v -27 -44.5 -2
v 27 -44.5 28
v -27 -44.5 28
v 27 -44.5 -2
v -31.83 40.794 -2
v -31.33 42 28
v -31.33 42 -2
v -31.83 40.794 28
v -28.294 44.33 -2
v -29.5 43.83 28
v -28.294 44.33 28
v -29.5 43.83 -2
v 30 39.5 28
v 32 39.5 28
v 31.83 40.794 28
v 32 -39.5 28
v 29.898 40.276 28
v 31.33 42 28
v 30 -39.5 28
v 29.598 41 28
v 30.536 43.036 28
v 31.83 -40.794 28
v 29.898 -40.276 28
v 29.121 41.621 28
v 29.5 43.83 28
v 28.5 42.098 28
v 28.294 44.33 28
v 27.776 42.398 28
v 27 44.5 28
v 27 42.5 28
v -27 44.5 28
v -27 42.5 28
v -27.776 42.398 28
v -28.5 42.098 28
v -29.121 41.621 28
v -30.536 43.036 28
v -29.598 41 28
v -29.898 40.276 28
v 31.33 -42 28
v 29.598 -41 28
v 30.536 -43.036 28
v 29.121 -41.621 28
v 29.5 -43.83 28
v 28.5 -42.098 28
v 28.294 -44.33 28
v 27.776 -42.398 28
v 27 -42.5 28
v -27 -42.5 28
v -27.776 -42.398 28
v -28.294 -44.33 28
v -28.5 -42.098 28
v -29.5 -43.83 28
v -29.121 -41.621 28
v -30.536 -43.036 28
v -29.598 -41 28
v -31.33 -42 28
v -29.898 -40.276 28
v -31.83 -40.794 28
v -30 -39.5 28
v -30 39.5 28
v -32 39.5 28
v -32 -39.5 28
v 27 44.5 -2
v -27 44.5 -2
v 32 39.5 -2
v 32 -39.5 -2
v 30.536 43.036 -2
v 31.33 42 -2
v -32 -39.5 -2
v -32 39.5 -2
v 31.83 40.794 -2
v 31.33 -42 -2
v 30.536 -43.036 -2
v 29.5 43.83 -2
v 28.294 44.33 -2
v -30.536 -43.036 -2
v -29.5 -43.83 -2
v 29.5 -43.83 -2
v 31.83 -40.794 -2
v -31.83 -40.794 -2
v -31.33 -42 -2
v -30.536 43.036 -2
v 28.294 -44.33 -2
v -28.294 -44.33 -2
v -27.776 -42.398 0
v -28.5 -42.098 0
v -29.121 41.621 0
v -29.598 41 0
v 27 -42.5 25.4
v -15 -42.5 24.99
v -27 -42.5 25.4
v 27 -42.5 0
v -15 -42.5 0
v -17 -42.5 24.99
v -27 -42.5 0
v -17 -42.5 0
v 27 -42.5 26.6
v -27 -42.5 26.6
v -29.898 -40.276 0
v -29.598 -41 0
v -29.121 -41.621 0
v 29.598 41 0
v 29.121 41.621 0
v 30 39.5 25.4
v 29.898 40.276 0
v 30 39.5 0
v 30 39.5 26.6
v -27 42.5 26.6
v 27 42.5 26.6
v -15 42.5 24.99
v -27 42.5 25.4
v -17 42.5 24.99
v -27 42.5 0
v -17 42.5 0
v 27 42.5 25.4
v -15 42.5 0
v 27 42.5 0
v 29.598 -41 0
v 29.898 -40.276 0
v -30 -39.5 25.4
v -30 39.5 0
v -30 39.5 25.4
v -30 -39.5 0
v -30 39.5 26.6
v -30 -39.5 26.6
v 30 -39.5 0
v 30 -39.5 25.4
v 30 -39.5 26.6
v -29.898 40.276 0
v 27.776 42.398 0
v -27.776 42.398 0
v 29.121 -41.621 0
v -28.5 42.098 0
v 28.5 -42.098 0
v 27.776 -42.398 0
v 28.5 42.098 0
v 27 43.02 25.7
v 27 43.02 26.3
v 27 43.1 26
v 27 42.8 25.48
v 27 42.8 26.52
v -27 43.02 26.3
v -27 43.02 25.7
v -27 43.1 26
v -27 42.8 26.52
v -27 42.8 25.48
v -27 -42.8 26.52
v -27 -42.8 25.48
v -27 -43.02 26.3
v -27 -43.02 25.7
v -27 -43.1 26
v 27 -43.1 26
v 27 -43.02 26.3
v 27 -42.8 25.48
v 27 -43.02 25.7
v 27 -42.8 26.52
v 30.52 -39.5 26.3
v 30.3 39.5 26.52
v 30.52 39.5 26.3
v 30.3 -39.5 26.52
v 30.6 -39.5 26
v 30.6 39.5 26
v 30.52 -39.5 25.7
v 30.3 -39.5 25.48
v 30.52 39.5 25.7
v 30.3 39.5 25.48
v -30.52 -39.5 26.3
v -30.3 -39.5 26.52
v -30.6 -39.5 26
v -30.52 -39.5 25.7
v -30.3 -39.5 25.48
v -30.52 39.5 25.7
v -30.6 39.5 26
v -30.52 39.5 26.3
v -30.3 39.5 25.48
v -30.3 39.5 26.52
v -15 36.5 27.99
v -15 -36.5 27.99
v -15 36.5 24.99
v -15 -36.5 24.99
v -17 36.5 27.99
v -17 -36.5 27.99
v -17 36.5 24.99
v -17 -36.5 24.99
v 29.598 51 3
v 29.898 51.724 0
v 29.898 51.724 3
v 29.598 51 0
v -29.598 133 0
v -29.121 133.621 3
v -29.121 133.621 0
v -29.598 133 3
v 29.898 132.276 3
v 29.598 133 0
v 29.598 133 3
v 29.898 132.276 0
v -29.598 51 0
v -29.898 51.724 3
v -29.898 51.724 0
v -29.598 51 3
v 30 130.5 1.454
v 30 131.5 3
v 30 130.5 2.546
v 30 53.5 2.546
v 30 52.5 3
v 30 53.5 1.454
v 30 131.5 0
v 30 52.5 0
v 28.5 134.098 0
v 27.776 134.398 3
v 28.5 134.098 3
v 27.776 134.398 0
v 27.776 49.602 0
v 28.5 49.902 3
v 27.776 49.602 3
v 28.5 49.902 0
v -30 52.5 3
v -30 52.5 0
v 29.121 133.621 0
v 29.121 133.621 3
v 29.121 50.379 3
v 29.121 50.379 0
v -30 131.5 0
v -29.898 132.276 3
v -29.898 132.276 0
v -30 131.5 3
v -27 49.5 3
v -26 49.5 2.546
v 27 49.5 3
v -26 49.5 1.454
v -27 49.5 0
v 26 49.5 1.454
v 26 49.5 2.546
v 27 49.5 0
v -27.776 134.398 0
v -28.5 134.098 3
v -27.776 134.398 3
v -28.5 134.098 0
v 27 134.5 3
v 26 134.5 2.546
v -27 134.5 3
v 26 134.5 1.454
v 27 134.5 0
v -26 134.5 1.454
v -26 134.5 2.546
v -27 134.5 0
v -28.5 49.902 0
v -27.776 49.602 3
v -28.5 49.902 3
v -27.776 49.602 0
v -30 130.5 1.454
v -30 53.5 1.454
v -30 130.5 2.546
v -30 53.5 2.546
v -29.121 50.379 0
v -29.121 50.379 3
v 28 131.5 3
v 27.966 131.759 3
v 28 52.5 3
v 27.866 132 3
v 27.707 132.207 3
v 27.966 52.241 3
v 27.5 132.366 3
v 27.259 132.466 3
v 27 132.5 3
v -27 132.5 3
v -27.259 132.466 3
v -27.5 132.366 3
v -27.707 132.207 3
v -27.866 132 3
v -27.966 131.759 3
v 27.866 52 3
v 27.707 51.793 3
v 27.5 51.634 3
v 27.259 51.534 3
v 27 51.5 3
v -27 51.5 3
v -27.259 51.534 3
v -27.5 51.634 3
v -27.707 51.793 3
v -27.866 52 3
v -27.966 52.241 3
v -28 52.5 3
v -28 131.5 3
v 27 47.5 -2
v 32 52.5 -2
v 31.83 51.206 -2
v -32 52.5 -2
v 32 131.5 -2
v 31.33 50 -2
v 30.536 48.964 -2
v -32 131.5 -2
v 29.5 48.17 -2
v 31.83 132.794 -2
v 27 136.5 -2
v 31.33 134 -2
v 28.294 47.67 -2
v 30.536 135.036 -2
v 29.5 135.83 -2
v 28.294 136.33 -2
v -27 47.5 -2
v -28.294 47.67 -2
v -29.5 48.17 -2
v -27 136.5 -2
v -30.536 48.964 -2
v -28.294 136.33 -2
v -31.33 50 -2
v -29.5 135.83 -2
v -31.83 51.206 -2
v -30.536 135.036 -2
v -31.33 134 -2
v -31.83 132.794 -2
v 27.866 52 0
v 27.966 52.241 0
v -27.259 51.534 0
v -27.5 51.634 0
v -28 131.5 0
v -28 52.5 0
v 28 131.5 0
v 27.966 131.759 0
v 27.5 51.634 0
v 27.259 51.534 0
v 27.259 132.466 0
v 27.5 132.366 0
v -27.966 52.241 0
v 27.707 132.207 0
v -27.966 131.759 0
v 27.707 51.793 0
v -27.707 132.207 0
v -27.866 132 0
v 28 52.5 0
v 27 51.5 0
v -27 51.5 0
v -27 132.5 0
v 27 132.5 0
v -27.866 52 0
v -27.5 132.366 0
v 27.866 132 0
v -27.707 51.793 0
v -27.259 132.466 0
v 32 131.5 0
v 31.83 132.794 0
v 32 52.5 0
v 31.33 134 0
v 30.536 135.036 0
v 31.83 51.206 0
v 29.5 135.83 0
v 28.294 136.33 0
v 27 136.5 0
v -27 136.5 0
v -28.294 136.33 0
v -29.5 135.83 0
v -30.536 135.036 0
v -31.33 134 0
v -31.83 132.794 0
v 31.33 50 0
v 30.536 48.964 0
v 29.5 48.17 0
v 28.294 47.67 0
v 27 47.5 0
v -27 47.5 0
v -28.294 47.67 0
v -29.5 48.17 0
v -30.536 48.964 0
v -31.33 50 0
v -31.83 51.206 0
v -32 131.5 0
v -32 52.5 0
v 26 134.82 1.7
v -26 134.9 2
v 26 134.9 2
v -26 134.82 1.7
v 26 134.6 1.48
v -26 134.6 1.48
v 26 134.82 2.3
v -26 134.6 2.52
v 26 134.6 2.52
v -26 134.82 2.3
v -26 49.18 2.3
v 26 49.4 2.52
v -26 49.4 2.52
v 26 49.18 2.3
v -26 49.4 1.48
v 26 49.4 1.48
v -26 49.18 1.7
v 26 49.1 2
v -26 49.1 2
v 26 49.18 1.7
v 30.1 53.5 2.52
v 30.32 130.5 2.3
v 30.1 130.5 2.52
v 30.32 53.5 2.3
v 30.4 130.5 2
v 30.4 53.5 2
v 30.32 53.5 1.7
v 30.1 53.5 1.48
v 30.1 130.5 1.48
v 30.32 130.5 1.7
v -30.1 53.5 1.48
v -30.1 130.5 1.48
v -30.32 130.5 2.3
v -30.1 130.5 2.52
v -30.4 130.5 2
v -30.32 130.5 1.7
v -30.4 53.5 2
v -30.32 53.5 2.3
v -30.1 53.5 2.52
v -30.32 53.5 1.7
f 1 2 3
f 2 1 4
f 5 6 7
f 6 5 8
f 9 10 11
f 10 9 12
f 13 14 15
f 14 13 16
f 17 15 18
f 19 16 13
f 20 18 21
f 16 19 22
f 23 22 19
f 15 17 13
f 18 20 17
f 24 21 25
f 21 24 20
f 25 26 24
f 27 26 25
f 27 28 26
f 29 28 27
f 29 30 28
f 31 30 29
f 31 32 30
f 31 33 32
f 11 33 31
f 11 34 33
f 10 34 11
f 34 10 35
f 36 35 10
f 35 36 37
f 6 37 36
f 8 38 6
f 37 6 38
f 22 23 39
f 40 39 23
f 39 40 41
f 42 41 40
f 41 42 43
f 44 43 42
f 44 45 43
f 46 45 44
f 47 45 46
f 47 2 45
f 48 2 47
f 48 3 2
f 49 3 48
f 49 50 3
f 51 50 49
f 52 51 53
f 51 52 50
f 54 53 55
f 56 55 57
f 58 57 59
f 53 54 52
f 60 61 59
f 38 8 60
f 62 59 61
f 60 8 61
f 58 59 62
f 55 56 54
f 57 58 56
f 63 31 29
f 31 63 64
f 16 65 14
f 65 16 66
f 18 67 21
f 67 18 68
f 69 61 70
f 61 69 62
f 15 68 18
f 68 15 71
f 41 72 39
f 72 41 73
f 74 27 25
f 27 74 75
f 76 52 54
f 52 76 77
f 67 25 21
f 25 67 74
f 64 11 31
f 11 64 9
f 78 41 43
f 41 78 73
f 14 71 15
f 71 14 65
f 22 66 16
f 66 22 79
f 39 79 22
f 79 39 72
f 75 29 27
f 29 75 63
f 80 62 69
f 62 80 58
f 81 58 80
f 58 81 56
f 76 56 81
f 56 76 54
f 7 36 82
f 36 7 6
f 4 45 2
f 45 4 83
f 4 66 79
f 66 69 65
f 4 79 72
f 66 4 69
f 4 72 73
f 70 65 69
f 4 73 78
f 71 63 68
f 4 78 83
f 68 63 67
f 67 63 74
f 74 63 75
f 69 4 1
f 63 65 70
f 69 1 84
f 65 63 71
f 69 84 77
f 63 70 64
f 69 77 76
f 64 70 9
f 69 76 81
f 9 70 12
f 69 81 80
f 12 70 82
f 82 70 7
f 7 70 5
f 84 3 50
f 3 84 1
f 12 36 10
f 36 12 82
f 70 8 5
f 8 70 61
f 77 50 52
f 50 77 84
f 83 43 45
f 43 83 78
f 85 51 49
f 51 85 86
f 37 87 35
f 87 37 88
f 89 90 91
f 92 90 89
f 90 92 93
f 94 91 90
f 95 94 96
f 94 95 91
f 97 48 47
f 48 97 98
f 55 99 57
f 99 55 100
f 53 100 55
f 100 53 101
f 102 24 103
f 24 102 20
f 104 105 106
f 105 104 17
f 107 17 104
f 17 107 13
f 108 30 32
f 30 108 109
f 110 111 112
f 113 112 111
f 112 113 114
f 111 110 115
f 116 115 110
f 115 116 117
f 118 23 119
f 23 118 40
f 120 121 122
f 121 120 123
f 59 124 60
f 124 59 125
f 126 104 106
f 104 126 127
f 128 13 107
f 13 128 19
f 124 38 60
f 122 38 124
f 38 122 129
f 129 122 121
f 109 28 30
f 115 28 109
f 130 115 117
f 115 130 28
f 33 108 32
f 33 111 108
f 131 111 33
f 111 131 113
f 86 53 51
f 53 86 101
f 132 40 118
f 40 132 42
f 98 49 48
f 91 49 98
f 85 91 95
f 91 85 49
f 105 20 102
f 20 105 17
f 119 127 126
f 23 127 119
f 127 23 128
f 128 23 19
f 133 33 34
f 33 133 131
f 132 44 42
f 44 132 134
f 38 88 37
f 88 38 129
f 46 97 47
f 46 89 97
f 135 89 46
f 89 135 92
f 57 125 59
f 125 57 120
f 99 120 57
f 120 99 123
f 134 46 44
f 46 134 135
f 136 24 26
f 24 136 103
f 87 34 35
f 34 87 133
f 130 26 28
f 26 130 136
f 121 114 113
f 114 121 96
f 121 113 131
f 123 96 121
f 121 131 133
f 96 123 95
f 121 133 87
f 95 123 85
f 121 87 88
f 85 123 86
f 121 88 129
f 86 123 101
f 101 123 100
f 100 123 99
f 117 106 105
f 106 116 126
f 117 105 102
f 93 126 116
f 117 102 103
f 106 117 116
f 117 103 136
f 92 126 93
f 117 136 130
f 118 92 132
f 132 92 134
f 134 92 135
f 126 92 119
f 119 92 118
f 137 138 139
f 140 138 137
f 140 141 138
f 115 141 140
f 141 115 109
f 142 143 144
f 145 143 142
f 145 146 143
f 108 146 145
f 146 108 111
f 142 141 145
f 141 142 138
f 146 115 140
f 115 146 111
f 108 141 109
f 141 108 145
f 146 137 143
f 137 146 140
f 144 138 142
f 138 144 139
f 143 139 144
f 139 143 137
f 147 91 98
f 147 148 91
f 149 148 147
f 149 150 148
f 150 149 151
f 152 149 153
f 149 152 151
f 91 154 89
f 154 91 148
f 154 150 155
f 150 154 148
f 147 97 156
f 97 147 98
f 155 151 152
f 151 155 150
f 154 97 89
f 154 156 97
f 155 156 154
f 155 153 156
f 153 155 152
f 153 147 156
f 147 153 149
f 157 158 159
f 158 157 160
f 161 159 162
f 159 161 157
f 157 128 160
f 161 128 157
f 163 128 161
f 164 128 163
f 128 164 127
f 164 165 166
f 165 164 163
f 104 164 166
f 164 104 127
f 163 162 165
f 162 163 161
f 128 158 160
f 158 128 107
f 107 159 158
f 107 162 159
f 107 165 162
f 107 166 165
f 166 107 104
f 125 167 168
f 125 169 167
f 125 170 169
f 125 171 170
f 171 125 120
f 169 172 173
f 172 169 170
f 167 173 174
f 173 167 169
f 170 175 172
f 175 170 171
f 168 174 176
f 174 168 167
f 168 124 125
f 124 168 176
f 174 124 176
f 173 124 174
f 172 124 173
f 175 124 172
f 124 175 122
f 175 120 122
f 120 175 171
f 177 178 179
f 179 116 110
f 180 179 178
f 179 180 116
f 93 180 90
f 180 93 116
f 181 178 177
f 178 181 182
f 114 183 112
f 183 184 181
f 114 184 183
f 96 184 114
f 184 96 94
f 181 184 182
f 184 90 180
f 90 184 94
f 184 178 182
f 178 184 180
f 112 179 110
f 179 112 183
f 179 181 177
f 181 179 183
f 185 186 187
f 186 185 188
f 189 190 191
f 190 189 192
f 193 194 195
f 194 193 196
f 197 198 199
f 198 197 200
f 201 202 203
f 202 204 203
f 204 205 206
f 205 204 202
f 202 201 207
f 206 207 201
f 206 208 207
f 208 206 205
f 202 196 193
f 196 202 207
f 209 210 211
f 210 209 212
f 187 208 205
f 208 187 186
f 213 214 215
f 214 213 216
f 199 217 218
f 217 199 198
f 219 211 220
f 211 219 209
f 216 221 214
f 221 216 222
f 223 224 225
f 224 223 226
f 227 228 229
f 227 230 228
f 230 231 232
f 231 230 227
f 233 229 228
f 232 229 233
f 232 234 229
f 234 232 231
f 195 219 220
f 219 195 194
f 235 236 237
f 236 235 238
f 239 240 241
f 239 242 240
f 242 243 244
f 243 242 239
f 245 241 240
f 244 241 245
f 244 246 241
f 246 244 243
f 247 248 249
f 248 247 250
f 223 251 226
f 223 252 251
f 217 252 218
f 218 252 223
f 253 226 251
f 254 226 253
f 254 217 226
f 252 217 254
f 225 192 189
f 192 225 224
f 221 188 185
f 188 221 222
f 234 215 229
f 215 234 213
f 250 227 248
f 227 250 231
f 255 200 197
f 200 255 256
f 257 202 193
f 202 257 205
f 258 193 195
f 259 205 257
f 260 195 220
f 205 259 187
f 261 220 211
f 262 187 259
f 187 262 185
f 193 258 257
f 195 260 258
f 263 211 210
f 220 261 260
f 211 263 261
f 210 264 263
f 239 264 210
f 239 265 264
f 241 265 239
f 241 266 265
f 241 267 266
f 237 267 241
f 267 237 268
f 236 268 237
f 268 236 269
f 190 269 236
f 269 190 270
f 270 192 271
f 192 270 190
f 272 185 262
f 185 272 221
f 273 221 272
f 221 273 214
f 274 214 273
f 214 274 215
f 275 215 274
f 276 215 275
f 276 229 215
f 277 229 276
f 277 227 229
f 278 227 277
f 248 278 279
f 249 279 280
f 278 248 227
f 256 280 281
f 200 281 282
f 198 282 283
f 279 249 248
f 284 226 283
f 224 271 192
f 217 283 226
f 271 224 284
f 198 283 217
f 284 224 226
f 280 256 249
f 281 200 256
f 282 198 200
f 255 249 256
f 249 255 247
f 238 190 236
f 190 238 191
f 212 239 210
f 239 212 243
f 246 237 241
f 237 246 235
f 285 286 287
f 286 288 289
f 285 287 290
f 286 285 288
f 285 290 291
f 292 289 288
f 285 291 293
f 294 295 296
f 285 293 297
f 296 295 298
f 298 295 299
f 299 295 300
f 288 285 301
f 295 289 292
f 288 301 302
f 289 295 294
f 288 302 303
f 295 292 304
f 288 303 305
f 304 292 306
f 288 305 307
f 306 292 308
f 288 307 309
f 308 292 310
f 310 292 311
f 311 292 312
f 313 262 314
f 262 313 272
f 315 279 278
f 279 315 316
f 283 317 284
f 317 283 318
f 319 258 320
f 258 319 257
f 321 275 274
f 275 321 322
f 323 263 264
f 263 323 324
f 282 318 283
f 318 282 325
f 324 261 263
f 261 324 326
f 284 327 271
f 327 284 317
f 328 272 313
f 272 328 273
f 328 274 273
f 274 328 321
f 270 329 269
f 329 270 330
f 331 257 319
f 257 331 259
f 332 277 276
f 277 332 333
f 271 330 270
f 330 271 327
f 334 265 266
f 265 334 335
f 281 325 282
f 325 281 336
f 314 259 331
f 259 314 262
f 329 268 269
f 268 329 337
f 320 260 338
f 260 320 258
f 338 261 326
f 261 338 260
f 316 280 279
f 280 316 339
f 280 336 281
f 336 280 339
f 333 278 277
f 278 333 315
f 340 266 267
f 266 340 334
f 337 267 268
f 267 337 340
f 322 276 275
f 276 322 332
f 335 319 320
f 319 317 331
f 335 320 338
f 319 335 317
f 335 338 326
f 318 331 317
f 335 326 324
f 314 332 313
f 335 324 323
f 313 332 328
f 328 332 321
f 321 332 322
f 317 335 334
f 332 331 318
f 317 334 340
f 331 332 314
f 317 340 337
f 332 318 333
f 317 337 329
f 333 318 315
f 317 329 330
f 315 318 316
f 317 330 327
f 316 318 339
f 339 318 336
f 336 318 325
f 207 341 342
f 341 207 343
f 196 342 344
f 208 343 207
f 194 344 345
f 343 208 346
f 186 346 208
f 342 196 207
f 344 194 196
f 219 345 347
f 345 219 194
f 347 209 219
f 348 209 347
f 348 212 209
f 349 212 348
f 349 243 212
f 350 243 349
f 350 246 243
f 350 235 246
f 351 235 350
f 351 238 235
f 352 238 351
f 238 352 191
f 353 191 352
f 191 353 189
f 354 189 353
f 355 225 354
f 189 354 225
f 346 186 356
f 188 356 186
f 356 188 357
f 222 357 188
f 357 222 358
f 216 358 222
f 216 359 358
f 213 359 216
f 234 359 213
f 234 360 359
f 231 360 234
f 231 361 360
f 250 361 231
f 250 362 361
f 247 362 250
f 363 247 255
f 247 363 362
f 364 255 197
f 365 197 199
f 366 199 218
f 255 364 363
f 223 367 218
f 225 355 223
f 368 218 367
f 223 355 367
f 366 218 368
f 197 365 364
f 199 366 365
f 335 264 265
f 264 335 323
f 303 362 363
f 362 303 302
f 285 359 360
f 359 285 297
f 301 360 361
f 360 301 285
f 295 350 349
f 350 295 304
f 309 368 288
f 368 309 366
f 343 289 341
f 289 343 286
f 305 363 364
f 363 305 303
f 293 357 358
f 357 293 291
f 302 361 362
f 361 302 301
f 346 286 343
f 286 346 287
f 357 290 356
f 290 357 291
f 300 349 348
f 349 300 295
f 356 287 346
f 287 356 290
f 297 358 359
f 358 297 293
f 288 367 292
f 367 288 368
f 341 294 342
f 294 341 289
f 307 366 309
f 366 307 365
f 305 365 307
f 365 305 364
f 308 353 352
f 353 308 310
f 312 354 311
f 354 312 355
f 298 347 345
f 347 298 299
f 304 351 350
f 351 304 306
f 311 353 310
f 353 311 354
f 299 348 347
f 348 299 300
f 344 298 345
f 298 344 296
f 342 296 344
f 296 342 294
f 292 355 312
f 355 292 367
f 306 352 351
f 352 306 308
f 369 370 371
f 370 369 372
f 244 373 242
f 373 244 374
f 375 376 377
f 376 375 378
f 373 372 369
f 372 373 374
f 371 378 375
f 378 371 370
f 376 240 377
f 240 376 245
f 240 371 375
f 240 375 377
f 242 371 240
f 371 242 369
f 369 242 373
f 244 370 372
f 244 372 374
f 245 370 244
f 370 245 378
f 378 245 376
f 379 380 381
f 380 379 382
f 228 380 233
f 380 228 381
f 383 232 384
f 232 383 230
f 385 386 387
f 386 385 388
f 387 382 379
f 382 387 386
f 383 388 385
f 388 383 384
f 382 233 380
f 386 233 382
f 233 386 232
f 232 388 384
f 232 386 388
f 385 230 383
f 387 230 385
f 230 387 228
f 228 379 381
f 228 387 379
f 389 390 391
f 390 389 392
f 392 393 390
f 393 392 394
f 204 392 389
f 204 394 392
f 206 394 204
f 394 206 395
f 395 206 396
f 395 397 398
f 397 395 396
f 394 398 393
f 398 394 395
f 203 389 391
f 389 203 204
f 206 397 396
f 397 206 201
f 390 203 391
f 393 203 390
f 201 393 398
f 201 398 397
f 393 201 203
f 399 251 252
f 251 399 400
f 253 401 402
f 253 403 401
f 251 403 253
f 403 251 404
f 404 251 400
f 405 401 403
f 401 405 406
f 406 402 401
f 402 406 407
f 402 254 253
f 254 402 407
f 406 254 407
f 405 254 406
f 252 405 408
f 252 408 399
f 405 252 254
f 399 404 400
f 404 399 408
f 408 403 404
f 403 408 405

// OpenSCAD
// V 1.2 Correction / hint from molotok3D, some minor fixes
// V 1.1- added opening helper and an optional separating wall

wi=60;	// inner width, length & heigth
li=85;
h=28;
th=2;	// wall thickness
r=3;	// radius of rounded corners
opening_help=false;	// make a gap to ease opening of the cover, f.ex.
		// with a coin - girls are afraid of their finger nails ;-)
separator=13;	// generate a separating wall inside - set to 0 for none

e=0.01;
ri=(r>th)?r-th:e;	// needed for the cover - needs to be larger than 0 for proper results
l=li-2*r;
w=wi-2*r;

module box(){
	difference(){
		translate([0,0,-th])hull(){
			for (i=[[-w/2,-l/2],[-w/2,l/2],[w/2,-l/2],[w/2,l/2]]){
				translate(i)cylinder(r=r+th,h=h+th,$fn=8*r);
			}
		}
		hull(){
			for (i=[[-w/2,-l/2],[-w/2,l/2,],[w/2,-l/2],[w/2,l/2]]){
				translate(i)cylinder(r=r,h=h,$fn=8*r);
			}
		}
		translate([-w/2,l/2+r,h-2])rotate([0,90,0])cylinder(d=1.2,h=w,$fn=12);
		translate([-w/2,-l/2-r,h-2])rotate([0,90,0])cylinder(d=1.2,h=w,$fn=12);
		translate([w/2+r,l/2,h-2])rotate([90,0,0])cylinder(d=1.2,h=l,$fn=12);
		translate([-w/2-r,l/2,h-2])rotate([90,0,0])cylinder(d=1.2,h=l,$fn=12);

		// if you need some adjustment for the opening helper size or position,
		// this is the right place
		if (opening_help)translate([w/2-10,l/2+13.5,h-1.8])cylinder(d=20,h=10,$fn=32);
	}
	if (separator>0){
		translate([separator-wi/2,-li/2-e,-e])difference(){
			cube([th,li+2*e,h]);
			translate([-e,-e,h-3])cube([th+2*e,2*th+2+2*e,5]);
			translate([-e,e+li-2*th-2,h-3])cube([th+2+2*e,2*th+2+2*e,5]);
		}
	}
}

module cover(){
	translate([0,0,-th])hull(){
		for (i=[[-w/2,-l/2],[-w/2,l/2],[w/2,-l/2],[w/2,l/2]]){
			translate(i)cylinder(r=r+th,h=th,$fn=8*r);
		}
	}
	difference(){
		translate([0,0,-th])hull(){
			for (i=[[-w/2,-l/2],[-w/2,l/2],[w/2,-l/2],[w/2,l/2]]){
				translate(i)cylinder(r=r,h=th+3,$fn=8*r);
			}
		}
		hull(){
			for (i=[[-w/2,-l/2],[-w/2,l/2],[w/2,-l/2],[w/2,l/2]]){
				if (r>th){
					translate(i)cylinder(r=r-th,h=3,$fn=8*r);
				}else{
					translate(i)cylinder(r=e,h=3,$fn=8*r);
				}
			}
		}
	}
	translate([-w/2+1,l/2+r-0.2,2])rotate([0,90,0])cylinder(d=1.2,h=w-2,$fn=12);
	translate([-w/2+1,-l/2-r+0.2,2])rotate([0,90,0])cylinder(d=1.2,h=w-2,$fn=12);
	translate([w/2+r-0.2,l/2-1,2])rotate([90,0,0])cylinder(d=1.2,h=l-2,$fn=12);
	translate([-w/2-r+0.2,l/2-1,2])rotate([90,0,0])cylinder(d=1.2,h=l-2,$fn=12);

}

box();
translate([0,li+3+2*th,0])
	cover();
